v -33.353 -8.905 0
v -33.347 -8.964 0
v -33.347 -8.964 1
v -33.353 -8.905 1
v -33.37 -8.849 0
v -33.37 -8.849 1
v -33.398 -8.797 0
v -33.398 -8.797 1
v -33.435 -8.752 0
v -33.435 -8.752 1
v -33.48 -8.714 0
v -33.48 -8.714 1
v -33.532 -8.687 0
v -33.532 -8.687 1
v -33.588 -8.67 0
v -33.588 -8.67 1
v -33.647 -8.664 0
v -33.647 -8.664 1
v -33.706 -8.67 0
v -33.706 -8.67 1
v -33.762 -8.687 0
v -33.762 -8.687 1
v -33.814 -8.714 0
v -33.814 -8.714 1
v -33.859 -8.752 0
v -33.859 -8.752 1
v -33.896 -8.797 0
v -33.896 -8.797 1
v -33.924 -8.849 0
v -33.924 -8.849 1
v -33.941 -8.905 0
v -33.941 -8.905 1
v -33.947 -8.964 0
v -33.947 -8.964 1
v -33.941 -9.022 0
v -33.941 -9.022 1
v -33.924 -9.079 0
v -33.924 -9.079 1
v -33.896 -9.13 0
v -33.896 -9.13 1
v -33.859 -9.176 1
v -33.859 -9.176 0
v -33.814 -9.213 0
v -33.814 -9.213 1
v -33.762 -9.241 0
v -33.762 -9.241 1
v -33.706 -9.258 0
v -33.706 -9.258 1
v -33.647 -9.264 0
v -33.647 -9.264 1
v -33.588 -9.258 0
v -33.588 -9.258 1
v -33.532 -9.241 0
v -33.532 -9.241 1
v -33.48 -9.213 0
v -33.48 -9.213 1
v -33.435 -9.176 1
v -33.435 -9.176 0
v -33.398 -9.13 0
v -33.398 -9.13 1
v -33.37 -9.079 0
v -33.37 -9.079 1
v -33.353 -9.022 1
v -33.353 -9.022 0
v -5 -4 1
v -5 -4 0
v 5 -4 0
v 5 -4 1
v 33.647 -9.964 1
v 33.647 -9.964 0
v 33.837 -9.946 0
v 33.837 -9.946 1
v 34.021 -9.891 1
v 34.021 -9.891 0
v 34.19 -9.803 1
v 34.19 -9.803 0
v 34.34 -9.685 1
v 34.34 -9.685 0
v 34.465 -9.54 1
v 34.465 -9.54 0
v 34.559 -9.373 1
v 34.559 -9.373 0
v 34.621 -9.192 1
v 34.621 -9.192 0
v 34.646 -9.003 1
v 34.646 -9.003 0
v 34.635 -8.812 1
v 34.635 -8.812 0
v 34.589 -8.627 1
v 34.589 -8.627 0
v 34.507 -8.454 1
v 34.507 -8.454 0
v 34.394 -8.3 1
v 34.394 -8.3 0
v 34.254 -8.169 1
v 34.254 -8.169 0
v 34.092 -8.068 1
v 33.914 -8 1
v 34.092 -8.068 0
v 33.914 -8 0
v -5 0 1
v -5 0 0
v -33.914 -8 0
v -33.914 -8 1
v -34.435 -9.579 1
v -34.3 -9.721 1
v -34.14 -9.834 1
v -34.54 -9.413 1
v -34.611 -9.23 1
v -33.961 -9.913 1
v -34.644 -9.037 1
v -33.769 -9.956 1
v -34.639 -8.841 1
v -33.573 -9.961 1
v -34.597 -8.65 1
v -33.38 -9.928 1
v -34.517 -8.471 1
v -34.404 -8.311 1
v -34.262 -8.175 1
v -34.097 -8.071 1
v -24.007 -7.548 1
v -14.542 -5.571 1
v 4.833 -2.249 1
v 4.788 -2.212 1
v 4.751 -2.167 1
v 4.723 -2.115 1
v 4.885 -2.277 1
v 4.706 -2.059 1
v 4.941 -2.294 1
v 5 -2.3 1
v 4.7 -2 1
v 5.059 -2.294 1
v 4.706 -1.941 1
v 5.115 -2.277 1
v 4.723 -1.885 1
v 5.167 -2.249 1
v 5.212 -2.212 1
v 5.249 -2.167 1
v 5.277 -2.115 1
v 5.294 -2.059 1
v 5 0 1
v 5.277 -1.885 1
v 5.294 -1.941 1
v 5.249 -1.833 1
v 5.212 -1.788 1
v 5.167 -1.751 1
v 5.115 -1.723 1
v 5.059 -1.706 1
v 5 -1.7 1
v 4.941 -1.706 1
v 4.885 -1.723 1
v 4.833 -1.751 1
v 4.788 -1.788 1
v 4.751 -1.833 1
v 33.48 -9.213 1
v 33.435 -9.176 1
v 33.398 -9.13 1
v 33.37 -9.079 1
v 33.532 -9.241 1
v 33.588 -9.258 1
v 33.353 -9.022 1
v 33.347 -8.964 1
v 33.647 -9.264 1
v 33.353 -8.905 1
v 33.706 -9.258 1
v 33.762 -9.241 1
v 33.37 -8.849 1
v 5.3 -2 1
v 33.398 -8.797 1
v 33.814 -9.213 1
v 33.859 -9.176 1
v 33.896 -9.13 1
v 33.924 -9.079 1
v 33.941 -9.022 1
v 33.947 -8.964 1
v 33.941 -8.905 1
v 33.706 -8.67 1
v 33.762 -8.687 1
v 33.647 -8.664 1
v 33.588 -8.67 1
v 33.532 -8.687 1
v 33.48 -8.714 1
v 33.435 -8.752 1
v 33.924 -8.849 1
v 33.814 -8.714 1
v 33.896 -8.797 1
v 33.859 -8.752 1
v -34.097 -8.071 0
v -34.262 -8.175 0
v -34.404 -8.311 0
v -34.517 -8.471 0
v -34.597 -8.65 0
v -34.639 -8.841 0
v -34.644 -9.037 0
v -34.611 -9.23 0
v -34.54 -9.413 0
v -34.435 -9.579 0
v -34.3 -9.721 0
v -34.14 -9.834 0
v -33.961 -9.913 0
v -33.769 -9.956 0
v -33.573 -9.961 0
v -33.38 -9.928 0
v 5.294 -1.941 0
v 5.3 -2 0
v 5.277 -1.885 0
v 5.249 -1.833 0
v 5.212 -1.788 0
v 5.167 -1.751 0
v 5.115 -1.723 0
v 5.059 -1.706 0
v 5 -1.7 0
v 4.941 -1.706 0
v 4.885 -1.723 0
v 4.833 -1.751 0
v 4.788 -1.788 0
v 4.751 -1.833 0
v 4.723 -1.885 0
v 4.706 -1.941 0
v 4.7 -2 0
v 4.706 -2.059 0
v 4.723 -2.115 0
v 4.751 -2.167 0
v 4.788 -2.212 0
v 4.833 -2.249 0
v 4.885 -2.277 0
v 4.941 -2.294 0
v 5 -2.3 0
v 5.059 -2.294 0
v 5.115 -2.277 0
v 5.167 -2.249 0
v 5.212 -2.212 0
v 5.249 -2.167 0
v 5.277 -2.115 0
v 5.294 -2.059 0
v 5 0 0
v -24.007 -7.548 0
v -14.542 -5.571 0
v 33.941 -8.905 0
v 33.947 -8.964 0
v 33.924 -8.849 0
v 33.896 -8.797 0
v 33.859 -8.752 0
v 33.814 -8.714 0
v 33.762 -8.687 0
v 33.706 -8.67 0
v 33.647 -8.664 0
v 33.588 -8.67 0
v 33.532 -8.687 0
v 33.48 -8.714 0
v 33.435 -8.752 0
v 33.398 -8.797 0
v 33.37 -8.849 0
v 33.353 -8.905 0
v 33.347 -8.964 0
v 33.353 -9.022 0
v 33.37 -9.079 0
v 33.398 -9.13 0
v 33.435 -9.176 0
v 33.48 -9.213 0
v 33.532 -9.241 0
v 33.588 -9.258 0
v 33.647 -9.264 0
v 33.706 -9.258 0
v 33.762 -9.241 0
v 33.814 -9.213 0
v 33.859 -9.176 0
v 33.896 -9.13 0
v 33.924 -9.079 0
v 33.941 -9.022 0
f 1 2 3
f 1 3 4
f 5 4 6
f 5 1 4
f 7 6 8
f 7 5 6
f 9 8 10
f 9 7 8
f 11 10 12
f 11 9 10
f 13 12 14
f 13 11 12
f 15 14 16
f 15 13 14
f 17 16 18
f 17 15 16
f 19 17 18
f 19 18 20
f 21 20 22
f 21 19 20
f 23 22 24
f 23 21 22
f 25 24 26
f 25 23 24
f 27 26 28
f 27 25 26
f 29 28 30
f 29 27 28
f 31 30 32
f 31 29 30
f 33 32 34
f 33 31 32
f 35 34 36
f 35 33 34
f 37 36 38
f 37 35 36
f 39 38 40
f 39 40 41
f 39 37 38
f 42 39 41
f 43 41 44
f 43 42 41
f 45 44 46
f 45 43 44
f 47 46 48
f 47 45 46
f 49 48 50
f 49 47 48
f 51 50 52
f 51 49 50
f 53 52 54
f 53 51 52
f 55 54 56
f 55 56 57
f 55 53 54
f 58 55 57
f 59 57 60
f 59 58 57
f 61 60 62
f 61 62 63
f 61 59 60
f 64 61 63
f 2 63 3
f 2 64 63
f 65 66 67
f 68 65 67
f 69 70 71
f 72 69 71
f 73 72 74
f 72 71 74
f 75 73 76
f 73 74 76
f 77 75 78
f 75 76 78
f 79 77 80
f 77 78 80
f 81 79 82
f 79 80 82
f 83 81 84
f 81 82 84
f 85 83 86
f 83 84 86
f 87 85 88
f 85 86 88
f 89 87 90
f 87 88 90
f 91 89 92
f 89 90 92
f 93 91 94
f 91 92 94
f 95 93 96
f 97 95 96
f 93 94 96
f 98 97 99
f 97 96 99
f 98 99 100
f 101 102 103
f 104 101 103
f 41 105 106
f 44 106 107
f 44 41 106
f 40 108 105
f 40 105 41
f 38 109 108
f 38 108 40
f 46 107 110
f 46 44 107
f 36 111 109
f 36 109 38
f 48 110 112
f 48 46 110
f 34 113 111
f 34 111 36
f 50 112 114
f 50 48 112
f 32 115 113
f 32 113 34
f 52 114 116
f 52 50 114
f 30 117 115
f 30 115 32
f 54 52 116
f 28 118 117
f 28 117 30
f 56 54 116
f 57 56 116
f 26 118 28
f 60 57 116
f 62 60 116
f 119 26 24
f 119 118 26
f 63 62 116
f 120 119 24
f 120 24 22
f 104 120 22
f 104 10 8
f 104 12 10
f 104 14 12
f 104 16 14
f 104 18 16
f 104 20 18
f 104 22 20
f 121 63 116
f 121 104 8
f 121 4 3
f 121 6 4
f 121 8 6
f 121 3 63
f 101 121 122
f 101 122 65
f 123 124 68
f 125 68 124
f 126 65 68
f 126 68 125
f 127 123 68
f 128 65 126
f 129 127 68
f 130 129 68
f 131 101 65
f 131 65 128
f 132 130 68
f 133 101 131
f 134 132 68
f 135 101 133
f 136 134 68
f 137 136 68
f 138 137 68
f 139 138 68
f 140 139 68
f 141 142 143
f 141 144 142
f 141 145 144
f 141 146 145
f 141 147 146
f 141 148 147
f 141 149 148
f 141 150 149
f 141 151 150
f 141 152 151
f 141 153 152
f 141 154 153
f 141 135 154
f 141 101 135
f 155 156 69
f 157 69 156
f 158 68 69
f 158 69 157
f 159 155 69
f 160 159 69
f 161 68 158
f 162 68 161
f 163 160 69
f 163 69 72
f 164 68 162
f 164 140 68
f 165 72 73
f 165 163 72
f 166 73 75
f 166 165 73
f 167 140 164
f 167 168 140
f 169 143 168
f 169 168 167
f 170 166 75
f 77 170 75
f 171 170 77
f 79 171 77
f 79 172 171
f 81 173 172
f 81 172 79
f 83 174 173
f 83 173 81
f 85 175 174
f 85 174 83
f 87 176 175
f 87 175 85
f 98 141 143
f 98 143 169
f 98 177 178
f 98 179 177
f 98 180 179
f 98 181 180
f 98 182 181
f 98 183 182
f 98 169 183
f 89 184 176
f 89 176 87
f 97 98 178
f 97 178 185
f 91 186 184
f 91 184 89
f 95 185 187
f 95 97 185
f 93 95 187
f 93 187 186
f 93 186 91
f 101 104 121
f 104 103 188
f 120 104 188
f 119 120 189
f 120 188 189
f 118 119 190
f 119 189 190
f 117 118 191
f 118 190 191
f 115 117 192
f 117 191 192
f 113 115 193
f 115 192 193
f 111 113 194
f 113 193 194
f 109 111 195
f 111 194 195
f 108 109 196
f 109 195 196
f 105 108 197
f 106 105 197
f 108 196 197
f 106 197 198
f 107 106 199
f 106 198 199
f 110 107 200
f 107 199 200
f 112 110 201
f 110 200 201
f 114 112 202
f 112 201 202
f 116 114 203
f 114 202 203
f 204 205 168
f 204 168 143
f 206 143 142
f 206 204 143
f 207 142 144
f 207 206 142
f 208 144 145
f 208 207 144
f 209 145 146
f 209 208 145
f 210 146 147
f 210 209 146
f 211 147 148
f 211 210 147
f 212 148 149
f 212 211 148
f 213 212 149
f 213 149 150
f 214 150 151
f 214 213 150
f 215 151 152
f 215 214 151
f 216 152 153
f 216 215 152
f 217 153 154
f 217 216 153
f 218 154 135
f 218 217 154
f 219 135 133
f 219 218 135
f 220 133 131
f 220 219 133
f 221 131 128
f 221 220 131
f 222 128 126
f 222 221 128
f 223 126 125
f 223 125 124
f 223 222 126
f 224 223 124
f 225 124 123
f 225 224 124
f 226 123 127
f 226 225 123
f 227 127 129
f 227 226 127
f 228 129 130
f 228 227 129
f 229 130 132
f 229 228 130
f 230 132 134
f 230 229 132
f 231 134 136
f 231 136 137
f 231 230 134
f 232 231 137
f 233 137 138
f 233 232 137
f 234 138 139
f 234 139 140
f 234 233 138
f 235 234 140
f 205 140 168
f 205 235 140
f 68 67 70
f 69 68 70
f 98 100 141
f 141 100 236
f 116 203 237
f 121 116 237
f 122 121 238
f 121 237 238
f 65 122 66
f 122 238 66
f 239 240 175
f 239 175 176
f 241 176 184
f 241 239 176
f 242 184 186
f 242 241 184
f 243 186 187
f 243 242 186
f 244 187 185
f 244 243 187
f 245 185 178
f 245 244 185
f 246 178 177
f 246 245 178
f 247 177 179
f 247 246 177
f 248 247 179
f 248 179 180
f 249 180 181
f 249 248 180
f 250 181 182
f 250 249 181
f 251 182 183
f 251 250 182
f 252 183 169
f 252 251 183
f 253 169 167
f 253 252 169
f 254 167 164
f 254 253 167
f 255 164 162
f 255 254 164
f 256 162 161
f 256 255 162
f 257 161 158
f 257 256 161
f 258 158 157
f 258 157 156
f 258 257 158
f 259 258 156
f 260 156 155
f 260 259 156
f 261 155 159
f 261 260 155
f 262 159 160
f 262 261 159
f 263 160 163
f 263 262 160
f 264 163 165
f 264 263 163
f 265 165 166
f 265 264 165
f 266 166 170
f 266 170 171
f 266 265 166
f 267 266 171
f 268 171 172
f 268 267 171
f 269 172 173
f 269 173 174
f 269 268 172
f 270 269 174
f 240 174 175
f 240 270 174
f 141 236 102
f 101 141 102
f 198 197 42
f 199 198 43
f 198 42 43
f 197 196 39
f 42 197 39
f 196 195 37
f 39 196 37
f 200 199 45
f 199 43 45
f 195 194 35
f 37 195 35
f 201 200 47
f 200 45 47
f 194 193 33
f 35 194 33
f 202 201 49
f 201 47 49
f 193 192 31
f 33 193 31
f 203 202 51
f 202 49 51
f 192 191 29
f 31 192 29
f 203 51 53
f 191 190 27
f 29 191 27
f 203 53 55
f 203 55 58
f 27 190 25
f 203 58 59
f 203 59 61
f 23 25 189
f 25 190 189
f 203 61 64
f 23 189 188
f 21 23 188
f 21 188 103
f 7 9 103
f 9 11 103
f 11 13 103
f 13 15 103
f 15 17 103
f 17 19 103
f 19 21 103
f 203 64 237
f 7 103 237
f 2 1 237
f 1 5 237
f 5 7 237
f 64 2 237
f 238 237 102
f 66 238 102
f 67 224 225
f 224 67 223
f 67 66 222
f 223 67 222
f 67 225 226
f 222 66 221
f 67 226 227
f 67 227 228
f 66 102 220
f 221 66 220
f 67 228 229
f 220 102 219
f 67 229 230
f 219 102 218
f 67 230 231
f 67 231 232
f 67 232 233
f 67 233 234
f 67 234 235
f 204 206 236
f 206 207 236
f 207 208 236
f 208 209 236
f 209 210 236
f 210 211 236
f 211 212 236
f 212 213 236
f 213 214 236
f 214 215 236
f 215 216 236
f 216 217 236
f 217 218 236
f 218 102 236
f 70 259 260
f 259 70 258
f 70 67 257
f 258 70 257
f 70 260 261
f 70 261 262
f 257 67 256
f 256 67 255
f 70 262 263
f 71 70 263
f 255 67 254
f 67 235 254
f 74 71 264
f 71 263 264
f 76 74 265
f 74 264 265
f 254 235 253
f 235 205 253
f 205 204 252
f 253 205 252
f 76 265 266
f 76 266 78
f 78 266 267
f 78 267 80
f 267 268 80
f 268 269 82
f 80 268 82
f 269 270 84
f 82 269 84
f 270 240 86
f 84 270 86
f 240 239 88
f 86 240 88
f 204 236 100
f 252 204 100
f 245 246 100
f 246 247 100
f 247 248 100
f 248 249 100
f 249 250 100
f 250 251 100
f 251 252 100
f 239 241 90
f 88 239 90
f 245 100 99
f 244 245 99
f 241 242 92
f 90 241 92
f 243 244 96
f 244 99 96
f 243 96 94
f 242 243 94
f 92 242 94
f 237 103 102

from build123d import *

# Parameters (mm, degrees)
SKETCH_1_R      = 0.3
EXTRUDE_1_DEPTH = 1


with BuildPart() as part:
    # 草图1 → 凸台-拉伸1 (new body)
    with BuildSketch(Plane.XY):
        with BuildLine():
            Line((-5, 0), (-33.91366459, -8))
            ThreePointArc((-33.91366459, -8), (-34.610786743, -9.230455486), (-33.380331256, -9.927577639))
            ThreePointArc((-33.380331256, -9.927577639), (-19.285084677, -6.509330991), (-5, -4))
            Line((-5, -4), (5, -4))
            Line((5, -4), (33.646997923, -9.96378882))
            ThreePointArc((33.646997923, -9.96378882), (34.637903776, -9.098345834), (33.91366459, -8))
            Line((33.91366459, -8), (5, 0))
            Line((5, 0), (-5, 0))
        make_face()
        with Locations((-33.646997923, -8.96378882)):
            Circle(SKETCH_1_R, mode=Mode.SUBTRACT)
        with Locations((5, -2)):
            Circle(SKETCH_1_R, mode=Mode.SUBTRACT)
        with Locations((33.646997923, -8.96378882)):
            Circle(SKETCH_1_R, mode=Mode.SUBTRACT)
    extrude(amount=EXTRUDE_1_DEPTH)


solid = part.part
